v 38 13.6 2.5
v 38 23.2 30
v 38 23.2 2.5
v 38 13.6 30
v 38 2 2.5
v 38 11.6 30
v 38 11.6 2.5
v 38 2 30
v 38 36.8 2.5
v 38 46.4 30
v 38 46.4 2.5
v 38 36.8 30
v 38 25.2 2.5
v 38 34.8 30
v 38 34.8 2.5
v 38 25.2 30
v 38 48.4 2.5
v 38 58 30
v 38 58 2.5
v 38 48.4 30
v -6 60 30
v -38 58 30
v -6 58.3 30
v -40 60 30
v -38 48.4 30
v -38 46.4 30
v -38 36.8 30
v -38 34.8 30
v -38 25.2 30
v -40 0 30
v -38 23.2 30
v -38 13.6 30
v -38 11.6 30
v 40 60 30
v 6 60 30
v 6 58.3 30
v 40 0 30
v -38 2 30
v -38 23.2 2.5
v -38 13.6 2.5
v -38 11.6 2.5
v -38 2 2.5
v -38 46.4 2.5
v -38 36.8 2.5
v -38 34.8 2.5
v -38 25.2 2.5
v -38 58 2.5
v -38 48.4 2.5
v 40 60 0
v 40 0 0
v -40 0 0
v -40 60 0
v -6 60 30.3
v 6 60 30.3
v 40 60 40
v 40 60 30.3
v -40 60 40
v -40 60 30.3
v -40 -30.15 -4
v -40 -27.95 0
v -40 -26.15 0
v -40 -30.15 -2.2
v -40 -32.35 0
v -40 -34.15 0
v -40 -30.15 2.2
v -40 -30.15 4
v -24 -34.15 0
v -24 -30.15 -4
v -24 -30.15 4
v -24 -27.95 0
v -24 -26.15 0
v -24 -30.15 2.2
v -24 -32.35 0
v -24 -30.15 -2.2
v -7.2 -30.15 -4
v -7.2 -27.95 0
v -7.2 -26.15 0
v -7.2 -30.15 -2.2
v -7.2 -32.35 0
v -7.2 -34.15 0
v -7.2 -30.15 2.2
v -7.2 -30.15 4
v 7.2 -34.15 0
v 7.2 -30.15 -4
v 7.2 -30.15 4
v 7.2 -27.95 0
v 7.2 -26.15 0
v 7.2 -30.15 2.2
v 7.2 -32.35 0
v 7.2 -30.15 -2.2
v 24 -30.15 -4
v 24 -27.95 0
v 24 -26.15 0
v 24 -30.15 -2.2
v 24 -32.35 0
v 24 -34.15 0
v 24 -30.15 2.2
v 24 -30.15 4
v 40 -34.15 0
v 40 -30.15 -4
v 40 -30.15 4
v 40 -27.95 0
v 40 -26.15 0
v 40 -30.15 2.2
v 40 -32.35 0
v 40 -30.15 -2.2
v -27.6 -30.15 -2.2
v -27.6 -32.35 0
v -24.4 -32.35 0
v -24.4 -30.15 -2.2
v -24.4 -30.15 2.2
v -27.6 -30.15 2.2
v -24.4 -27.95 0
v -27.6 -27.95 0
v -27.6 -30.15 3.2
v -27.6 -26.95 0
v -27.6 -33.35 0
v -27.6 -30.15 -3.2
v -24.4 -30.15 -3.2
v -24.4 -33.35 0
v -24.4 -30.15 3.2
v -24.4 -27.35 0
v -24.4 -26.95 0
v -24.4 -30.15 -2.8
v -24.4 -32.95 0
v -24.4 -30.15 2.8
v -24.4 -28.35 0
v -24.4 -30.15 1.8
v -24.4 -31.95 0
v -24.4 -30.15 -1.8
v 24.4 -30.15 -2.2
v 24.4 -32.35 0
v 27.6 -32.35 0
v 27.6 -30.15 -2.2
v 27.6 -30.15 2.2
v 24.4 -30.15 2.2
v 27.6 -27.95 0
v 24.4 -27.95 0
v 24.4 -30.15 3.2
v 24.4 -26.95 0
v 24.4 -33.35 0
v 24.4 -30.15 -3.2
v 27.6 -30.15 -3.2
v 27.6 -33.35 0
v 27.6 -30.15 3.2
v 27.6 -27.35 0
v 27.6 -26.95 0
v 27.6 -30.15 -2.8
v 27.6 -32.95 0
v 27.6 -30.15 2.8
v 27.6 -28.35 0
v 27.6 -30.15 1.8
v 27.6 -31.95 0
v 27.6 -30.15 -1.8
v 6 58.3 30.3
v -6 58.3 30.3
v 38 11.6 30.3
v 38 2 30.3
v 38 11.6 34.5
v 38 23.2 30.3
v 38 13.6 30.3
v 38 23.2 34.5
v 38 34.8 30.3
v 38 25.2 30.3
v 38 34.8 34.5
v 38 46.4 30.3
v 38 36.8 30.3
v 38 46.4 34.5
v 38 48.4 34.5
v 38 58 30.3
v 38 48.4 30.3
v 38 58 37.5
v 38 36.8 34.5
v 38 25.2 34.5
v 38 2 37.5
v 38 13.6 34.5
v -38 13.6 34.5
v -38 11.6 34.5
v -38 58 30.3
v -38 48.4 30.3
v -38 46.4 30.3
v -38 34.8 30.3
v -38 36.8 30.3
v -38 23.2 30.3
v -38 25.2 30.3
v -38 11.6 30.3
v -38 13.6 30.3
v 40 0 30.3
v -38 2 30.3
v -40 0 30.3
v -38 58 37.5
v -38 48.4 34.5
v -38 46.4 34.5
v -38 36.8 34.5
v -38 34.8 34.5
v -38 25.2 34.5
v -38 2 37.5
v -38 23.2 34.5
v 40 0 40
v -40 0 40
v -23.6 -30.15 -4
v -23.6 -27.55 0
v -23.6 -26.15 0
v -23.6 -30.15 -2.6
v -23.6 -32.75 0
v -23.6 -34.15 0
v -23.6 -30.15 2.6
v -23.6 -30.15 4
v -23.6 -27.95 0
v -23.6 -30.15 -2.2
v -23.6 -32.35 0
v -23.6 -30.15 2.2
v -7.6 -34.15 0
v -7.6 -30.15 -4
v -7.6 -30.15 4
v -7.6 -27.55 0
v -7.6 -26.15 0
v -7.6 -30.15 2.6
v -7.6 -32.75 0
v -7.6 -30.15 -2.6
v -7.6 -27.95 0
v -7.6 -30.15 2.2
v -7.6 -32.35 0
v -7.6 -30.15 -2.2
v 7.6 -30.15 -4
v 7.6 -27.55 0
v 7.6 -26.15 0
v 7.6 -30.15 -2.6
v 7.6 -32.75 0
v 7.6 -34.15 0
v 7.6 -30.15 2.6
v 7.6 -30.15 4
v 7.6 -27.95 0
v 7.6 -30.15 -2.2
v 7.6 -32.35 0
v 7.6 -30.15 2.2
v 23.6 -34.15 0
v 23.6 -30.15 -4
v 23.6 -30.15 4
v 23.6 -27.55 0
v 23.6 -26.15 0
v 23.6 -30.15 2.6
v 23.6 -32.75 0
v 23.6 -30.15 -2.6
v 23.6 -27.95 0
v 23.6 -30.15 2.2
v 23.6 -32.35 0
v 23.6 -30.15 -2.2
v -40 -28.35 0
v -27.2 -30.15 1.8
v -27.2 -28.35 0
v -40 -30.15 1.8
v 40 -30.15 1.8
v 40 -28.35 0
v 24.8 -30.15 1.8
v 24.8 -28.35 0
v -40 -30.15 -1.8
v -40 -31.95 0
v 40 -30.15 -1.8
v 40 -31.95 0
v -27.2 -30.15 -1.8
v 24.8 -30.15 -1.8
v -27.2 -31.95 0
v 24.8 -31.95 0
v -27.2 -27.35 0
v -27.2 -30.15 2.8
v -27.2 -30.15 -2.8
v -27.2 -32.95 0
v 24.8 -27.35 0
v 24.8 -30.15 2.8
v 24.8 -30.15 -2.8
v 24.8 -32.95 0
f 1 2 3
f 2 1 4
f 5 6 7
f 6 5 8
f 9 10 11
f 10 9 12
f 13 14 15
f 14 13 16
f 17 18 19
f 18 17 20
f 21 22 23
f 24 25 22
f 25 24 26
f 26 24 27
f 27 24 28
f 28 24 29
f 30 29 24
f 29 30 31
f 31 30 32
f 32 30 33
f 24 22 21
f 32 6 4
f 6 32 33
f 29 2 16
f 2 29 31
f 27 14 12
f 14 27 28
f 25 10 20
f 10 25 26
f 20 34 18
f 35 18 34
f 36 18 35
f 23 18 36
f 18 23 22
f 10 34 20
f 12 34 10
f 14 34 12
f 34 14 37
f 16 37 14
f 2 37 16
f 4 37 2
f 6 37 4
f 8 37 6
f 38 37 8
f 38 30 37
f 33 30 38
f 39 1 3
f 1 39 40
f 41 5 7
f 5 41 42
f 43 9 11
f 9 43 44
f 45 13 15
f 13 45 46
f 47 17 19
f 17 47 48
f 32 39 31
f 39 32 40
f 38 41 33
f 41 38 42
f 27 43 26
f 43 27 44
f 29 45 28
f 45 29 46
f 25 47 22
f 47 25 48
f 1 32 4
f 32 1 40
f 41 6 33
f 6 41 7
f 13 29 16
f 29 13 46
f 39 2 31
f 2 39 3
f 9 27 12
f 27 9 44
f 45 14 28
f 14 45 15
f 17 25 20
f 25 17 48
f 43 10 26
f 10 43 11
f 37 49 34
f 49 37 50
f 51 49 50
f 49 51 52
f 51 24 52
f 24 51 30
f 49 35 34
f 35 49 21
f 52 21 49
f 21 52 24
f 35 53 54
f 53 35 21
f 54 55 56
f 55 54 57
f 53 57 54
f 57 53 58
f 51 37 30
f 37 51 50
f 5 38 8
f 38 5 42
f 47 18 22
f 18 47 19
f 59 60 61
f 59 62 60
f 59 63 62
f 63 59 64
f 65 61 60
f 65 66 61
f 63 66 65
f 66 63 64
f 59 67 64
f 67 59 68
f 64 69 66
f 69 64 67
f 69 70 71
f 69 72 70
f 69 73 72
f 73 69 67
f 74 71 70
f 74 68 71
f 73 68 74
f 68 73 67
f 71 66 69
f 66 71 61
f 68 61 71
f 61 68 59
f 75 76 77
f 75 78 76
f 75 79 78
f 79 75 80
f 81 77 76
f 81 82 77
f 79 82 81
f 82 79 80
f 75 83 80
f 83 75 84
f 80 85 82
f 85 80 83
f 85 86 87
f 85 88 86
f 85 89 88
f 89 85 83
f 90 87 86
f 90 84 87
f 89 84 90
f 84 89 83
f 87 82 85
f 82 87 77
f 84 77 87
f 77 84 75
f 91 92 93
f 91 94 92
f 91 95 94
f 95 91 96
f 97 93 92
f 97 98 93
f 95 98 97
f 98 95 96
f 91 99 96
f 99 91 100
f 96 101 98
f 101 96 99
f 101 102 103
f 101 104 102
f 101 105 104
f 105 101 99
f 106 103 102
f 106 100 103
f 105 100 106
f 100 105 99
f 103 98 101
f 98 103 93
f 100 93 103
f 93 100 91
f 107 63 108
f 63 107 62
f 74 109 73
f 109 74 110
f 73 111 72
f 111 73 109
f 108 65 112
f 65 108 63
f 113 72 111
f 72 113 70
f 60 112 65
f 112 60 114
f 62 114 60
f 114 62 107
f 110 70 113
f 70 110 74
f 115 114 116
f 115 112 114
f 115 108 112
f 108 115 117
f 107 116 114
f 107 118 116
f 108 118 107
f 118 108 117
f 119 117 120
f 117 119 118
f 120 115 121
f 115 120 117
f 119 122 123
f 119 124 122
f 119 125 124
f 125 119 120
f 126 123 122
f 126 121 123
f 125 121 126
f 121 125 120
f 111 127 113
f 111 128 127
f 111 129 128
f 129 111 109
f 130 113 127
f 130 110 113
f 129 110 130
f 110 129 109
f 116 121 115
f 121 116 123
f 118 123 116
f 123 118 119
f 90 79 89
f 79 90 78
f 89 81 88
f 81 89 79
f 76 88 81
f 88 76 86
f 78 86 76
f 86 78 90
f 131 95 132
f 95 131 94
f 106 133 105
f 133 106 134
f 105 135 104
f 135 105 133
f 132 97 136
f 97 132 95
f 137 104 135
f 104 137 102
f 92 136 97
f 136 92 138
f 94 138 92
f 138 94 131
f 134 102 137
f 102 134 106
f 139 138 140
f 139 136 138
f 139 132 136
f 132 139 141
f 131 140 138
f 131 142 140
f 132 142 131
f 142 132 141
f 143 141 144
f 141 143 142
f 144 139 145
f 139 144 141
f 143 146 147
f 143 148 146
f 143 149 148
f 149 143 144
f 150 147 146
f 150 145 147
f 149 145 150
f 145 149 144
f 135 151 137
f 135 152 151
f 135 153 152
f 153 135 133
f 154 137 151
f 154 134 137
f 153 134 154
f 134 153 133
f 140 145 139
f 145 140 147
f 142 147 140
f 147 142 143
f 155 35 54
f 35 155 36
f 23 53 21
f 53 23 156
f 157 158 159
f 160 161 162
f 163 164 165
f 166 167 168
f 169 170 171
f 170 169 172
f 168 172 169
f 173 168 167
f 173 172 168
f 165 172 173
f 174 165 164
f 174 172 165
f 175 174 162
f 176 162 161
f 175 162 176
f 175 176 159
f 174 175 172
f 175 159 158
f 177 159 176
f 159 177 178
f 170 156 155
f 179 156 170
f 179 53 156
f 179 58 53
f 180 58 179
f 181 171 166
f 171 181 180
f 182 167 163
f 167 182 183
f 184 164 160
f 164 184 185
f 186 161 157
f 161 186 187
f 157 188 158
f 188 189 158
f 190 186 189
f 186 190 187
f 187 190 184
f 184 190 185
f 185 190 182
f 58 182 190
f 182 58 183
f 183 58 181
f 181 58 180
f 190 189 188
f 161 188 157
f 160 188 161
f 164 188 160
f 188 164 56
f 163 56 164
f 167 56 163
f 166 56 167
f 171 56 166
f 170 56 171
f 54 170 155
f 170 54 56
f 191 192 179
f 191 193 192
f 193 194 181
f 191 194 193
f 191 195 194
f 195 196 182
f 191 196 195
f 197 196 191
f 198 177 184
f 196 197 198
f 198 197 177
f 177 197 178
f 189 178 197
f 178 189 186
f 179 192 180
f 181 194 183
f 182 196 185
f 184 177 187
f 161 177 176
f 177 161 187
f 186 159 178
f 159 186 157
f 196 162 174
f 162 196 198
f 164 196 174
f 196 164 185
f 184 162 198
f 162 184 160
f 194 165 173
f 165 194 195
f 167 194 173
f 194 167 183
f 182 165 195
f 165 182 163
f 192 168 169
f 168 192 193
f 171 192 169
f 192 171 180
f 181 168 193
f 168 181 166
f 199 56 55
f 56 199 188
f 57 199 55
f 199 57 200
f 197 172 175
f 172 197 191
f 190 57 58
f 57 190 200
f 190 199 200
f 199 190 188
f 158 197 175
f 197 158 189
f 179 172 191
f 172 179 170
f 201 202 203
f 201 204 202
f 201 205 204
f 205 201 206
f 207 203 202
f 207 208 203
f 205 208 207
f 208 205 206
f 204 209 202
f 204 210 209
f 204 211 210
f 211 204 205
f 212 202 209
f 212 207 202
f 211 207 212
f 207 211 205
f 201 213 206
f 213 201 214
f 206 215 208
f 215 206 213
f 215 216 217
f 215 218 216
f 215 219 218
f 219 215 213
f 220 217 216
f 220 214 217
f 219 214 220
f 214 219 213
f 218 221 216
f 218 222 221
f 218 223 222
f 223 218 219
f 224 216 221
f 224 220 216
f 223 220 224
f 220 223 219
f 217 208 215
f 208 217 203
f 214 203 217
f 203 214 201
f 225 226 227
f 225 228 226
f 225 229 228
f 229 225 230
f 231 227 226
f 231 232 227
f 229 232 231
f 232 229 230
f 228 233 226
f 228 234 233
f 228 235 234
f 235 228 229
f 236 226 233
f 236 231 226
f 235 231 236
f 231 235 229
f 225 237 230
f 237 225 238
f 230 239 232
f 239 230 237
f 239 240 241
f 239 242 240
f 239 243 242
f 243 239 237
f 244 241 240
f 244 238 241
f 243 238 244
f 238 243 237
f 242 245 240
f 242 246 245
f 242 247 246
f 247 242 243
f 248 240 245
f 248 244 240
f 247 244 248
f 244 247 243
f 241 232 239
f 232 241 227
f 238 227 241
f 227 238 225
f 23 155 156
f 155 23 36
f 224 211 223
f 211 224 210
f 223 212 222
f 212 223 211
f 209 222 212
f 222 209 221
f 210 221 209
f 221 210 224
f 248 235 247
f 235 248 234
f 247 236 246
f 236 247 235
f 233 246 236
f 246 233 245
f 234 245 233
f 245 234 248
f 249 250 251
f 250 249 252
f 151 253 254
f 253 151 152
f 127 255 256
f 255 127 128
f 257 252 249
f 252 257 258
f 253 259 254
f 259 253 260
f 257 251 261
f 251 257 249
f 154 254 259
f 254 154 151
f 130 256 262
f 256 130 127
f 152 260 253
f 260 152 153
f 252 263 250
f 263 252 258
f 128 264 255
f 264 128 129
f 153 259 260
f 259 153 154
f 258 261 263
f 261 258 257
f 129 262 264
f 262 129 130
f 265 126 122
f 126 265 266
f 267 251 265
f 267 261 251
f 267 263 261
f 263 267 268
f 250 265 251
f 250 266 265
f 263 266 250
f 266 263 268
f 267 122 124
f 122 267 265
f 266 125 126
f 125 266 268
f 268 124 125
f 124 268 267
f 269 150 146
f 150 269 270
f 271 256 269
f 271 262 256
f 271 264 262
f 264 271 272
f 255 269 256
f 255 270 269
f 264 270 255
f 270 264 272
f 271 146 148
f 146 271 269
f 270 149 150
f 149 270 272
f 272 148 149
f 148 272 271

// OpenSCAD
/* Box with print-in-place hinge - step 1: params + base */
part = "assembly"; // [base, lid, pin, assembly]

cadverify_only = "";
module instance(name, part, unit = 1) {
    echo(cadverify_instance = [name, part, unit]);
    if (cadverify_only == "" || cadverify_only == name) children();
}

// ---- parameters (mm) ----
W = 80; D = 60; H = 40;          // body outer, closed
baseH = 30;                      // base height
gapZLid = 0.3;                   // lid-base vertical gap
lidBot = baseH + gapZLid;        // 30.3
lidTop = H;                      // 40
axY = 2; axZ = baseH + gapZLid/2; // hinge axis (2, 30.15)
wallT = 2; floorT = 2.5; lidTopT = 2.5;
pinH = 1.8; boreH = 2.2; outH = 4.0; cbH = 3.2; capH = 2.8;
clrR = 0.4; clrA = 0.4;
divT = 2; divTop = 37.2;

// knuckle X intervals
bx10=-40; bx11=-24; lx10=-23.6; lx11=-7.6;
bx20=-7.2; bx21=7.2; lx20=7.6; lx21=23.6; bx30=24; bx31=40;

// generic prism along X from polygon in (Z,Y) mapped: poly points [z,y]
module prism_x(poly, x0, len) {
    translate([x0, 0, 0]) rotate([0,90,0])
        linear_extrude(height=len) polygon(poly);
}
function diamond(h) = [[-h,0],[0,-h],[h,0],[0,h]];

module knuckle_out(x0, len) {
    // diamond cross-section points [z,y] centered at (axZ, axY)
    p = diamond(outH);
    translate([0, axY, axZ]) prism_x(p, x0, len);
}
module bore_small(x0, len) {
    p = diamond(boreH);
    translate([0, axY, axZ]) prism_x(p, x0, len);
}
module bore_cb(x0, len) {
    p = diamond(cbH);
    translate([0, axY, axZ]) prism_x(p, x0, len);
}

function D(h,y0,z0) = [[y0-h,-z0],[y0,-z0-h],[y0+h,-z0],[y0,-z0+h]];
module dia(h,y0,z0,x0,x1) {
    translate([x0,0,0]) rotate([0,90,0])
        linear_extrude(height=x1-x0, convexity=4) polygon(D(h,y0,z0));
}
module base_geo() {
    difference() {
        union() {
            translate([-40,0,0]) cube([80,60,2.5]);            // floor
            translate([-40,0,0]) cube([80,2,30]);              // back wall
            translate([-40,58,0]) cube([80,2,30]);             // front wall
            translate([-40,2,0]) cube([2,56,30]);              // left wall
            translate([38,2,0]) cube([2,56,30]);               // right wall
            for (cy=[12.6,24.2,35.8,47.4])
                translate([-38,cy-1,2.5]) cube([76,2,27.5]);   // dividers
            dia(outH,0,axZ,bx10,bx11);                         // knuckles
            dia(outH,0,axZ,bx20,bx21);
            dia(outH,0,axZ,bx30,bx31);
        }
        // bore channels + cap pockets
        dia(boreH,0,axZ,bx10,bx11); dia(cbH,0,axZ,-27.6,-24.4);
        dia(boreH,0,axZ,bx20,bx21);
        dia(boreH,0,axZ,bx30,bx31); dia(cbH,0,axZ,24.4,27.6);
        // back-wall notches under lid knuckles
        dia(boreH+clrR,0,axZ,lx10,lx11);
        dia(boreH+clrR,0,axZ,lx20,lx21);
        // catch groove in front wall outer face
        translate([-6,58.8,27.5]) cube([12,1.21,1.5]);
    }
}

module lid_geo() {
    difference() {
        union() {
            // top plate: x -40..40, y 0..60, z 37.5..40
            translate([-40,0,37.5]) cube([80,60,2.5]);
            // lid skirt walls 2mm, y 0..60, z 30.3..37.5
            translate([-40,0,30.3]) cube([80,2,7.2]);    // back band
            translate([-40,58,30.3]) cube([80,2,7.2]);   // front band
            translate([-40,2,30.3]) cube([2,56,7.2]);    // left band
            translate([38,2,30.3]) cube([2,56,7.2]);     // right band
            // lid skirt inner closure panels (also skirt divider walls)
            for (cy=[12.6,24.2,35.8,47.4])
                translate([-38,cy-1,30.3]) cube([76,2,4.2]);  // up to 34.5
            // lid knuckles + catch tongue
            dia(outH,0,axZ,lx10,lx11);
            dia(outH,0,axZ,lx20,lx21);
            translate([-6,58.3,27.5]) cube([12,1.7,3.4]);  // tongue tab below front band
        }
        // bore channels
        dia(boreH,0,axZ,lx10,lx11);
        dia(boreH,0,axZ,lx20,lx21);
        // clearance pockets opposite base knuckles
        dia(boreH+clrR,0,axZ,-27.6,-23.6);
        dia(boreH+clrR,0,axZ,-7.6,-7.2);
        dia(boreH+clrR,0,axZ,7.2,7.6);
        dia(boreH+clrR,0,axZ,23.6,27.6);
    }
}
module pin_geo() {
    difference() {
        union() {
            // shaft full hinge length x -40..40
            dia(pinH,0,axZ,-40,40);
            // retaining collars trapped in base counterbores
            dia(capH,0,axZ,-27.2,-24.4);      // left head in pocket -27.6..-24.4
            dia(capH,0,axZ,24.8,27.6);        // right head in pocket 24.4..27.6
        }
        // left head slot (screwdriver grip) open at bottom
        translate([-26.6,-1.1,axZ-14]) cube([2.2,2.2,14]);
    }
}
// --- part orientation helpers + spec + assembly ---

if (part=="base") { base_geo(); }
else if (part=="lid") { lid_geo(); }
else if (part=="pin") { pin_geo(); }
else if (part=="assembly") {
    instance("base","base") base_geo();
    instance("lid","lid") lid_geo();
    instance("pin","pin") pin_geo();
}
